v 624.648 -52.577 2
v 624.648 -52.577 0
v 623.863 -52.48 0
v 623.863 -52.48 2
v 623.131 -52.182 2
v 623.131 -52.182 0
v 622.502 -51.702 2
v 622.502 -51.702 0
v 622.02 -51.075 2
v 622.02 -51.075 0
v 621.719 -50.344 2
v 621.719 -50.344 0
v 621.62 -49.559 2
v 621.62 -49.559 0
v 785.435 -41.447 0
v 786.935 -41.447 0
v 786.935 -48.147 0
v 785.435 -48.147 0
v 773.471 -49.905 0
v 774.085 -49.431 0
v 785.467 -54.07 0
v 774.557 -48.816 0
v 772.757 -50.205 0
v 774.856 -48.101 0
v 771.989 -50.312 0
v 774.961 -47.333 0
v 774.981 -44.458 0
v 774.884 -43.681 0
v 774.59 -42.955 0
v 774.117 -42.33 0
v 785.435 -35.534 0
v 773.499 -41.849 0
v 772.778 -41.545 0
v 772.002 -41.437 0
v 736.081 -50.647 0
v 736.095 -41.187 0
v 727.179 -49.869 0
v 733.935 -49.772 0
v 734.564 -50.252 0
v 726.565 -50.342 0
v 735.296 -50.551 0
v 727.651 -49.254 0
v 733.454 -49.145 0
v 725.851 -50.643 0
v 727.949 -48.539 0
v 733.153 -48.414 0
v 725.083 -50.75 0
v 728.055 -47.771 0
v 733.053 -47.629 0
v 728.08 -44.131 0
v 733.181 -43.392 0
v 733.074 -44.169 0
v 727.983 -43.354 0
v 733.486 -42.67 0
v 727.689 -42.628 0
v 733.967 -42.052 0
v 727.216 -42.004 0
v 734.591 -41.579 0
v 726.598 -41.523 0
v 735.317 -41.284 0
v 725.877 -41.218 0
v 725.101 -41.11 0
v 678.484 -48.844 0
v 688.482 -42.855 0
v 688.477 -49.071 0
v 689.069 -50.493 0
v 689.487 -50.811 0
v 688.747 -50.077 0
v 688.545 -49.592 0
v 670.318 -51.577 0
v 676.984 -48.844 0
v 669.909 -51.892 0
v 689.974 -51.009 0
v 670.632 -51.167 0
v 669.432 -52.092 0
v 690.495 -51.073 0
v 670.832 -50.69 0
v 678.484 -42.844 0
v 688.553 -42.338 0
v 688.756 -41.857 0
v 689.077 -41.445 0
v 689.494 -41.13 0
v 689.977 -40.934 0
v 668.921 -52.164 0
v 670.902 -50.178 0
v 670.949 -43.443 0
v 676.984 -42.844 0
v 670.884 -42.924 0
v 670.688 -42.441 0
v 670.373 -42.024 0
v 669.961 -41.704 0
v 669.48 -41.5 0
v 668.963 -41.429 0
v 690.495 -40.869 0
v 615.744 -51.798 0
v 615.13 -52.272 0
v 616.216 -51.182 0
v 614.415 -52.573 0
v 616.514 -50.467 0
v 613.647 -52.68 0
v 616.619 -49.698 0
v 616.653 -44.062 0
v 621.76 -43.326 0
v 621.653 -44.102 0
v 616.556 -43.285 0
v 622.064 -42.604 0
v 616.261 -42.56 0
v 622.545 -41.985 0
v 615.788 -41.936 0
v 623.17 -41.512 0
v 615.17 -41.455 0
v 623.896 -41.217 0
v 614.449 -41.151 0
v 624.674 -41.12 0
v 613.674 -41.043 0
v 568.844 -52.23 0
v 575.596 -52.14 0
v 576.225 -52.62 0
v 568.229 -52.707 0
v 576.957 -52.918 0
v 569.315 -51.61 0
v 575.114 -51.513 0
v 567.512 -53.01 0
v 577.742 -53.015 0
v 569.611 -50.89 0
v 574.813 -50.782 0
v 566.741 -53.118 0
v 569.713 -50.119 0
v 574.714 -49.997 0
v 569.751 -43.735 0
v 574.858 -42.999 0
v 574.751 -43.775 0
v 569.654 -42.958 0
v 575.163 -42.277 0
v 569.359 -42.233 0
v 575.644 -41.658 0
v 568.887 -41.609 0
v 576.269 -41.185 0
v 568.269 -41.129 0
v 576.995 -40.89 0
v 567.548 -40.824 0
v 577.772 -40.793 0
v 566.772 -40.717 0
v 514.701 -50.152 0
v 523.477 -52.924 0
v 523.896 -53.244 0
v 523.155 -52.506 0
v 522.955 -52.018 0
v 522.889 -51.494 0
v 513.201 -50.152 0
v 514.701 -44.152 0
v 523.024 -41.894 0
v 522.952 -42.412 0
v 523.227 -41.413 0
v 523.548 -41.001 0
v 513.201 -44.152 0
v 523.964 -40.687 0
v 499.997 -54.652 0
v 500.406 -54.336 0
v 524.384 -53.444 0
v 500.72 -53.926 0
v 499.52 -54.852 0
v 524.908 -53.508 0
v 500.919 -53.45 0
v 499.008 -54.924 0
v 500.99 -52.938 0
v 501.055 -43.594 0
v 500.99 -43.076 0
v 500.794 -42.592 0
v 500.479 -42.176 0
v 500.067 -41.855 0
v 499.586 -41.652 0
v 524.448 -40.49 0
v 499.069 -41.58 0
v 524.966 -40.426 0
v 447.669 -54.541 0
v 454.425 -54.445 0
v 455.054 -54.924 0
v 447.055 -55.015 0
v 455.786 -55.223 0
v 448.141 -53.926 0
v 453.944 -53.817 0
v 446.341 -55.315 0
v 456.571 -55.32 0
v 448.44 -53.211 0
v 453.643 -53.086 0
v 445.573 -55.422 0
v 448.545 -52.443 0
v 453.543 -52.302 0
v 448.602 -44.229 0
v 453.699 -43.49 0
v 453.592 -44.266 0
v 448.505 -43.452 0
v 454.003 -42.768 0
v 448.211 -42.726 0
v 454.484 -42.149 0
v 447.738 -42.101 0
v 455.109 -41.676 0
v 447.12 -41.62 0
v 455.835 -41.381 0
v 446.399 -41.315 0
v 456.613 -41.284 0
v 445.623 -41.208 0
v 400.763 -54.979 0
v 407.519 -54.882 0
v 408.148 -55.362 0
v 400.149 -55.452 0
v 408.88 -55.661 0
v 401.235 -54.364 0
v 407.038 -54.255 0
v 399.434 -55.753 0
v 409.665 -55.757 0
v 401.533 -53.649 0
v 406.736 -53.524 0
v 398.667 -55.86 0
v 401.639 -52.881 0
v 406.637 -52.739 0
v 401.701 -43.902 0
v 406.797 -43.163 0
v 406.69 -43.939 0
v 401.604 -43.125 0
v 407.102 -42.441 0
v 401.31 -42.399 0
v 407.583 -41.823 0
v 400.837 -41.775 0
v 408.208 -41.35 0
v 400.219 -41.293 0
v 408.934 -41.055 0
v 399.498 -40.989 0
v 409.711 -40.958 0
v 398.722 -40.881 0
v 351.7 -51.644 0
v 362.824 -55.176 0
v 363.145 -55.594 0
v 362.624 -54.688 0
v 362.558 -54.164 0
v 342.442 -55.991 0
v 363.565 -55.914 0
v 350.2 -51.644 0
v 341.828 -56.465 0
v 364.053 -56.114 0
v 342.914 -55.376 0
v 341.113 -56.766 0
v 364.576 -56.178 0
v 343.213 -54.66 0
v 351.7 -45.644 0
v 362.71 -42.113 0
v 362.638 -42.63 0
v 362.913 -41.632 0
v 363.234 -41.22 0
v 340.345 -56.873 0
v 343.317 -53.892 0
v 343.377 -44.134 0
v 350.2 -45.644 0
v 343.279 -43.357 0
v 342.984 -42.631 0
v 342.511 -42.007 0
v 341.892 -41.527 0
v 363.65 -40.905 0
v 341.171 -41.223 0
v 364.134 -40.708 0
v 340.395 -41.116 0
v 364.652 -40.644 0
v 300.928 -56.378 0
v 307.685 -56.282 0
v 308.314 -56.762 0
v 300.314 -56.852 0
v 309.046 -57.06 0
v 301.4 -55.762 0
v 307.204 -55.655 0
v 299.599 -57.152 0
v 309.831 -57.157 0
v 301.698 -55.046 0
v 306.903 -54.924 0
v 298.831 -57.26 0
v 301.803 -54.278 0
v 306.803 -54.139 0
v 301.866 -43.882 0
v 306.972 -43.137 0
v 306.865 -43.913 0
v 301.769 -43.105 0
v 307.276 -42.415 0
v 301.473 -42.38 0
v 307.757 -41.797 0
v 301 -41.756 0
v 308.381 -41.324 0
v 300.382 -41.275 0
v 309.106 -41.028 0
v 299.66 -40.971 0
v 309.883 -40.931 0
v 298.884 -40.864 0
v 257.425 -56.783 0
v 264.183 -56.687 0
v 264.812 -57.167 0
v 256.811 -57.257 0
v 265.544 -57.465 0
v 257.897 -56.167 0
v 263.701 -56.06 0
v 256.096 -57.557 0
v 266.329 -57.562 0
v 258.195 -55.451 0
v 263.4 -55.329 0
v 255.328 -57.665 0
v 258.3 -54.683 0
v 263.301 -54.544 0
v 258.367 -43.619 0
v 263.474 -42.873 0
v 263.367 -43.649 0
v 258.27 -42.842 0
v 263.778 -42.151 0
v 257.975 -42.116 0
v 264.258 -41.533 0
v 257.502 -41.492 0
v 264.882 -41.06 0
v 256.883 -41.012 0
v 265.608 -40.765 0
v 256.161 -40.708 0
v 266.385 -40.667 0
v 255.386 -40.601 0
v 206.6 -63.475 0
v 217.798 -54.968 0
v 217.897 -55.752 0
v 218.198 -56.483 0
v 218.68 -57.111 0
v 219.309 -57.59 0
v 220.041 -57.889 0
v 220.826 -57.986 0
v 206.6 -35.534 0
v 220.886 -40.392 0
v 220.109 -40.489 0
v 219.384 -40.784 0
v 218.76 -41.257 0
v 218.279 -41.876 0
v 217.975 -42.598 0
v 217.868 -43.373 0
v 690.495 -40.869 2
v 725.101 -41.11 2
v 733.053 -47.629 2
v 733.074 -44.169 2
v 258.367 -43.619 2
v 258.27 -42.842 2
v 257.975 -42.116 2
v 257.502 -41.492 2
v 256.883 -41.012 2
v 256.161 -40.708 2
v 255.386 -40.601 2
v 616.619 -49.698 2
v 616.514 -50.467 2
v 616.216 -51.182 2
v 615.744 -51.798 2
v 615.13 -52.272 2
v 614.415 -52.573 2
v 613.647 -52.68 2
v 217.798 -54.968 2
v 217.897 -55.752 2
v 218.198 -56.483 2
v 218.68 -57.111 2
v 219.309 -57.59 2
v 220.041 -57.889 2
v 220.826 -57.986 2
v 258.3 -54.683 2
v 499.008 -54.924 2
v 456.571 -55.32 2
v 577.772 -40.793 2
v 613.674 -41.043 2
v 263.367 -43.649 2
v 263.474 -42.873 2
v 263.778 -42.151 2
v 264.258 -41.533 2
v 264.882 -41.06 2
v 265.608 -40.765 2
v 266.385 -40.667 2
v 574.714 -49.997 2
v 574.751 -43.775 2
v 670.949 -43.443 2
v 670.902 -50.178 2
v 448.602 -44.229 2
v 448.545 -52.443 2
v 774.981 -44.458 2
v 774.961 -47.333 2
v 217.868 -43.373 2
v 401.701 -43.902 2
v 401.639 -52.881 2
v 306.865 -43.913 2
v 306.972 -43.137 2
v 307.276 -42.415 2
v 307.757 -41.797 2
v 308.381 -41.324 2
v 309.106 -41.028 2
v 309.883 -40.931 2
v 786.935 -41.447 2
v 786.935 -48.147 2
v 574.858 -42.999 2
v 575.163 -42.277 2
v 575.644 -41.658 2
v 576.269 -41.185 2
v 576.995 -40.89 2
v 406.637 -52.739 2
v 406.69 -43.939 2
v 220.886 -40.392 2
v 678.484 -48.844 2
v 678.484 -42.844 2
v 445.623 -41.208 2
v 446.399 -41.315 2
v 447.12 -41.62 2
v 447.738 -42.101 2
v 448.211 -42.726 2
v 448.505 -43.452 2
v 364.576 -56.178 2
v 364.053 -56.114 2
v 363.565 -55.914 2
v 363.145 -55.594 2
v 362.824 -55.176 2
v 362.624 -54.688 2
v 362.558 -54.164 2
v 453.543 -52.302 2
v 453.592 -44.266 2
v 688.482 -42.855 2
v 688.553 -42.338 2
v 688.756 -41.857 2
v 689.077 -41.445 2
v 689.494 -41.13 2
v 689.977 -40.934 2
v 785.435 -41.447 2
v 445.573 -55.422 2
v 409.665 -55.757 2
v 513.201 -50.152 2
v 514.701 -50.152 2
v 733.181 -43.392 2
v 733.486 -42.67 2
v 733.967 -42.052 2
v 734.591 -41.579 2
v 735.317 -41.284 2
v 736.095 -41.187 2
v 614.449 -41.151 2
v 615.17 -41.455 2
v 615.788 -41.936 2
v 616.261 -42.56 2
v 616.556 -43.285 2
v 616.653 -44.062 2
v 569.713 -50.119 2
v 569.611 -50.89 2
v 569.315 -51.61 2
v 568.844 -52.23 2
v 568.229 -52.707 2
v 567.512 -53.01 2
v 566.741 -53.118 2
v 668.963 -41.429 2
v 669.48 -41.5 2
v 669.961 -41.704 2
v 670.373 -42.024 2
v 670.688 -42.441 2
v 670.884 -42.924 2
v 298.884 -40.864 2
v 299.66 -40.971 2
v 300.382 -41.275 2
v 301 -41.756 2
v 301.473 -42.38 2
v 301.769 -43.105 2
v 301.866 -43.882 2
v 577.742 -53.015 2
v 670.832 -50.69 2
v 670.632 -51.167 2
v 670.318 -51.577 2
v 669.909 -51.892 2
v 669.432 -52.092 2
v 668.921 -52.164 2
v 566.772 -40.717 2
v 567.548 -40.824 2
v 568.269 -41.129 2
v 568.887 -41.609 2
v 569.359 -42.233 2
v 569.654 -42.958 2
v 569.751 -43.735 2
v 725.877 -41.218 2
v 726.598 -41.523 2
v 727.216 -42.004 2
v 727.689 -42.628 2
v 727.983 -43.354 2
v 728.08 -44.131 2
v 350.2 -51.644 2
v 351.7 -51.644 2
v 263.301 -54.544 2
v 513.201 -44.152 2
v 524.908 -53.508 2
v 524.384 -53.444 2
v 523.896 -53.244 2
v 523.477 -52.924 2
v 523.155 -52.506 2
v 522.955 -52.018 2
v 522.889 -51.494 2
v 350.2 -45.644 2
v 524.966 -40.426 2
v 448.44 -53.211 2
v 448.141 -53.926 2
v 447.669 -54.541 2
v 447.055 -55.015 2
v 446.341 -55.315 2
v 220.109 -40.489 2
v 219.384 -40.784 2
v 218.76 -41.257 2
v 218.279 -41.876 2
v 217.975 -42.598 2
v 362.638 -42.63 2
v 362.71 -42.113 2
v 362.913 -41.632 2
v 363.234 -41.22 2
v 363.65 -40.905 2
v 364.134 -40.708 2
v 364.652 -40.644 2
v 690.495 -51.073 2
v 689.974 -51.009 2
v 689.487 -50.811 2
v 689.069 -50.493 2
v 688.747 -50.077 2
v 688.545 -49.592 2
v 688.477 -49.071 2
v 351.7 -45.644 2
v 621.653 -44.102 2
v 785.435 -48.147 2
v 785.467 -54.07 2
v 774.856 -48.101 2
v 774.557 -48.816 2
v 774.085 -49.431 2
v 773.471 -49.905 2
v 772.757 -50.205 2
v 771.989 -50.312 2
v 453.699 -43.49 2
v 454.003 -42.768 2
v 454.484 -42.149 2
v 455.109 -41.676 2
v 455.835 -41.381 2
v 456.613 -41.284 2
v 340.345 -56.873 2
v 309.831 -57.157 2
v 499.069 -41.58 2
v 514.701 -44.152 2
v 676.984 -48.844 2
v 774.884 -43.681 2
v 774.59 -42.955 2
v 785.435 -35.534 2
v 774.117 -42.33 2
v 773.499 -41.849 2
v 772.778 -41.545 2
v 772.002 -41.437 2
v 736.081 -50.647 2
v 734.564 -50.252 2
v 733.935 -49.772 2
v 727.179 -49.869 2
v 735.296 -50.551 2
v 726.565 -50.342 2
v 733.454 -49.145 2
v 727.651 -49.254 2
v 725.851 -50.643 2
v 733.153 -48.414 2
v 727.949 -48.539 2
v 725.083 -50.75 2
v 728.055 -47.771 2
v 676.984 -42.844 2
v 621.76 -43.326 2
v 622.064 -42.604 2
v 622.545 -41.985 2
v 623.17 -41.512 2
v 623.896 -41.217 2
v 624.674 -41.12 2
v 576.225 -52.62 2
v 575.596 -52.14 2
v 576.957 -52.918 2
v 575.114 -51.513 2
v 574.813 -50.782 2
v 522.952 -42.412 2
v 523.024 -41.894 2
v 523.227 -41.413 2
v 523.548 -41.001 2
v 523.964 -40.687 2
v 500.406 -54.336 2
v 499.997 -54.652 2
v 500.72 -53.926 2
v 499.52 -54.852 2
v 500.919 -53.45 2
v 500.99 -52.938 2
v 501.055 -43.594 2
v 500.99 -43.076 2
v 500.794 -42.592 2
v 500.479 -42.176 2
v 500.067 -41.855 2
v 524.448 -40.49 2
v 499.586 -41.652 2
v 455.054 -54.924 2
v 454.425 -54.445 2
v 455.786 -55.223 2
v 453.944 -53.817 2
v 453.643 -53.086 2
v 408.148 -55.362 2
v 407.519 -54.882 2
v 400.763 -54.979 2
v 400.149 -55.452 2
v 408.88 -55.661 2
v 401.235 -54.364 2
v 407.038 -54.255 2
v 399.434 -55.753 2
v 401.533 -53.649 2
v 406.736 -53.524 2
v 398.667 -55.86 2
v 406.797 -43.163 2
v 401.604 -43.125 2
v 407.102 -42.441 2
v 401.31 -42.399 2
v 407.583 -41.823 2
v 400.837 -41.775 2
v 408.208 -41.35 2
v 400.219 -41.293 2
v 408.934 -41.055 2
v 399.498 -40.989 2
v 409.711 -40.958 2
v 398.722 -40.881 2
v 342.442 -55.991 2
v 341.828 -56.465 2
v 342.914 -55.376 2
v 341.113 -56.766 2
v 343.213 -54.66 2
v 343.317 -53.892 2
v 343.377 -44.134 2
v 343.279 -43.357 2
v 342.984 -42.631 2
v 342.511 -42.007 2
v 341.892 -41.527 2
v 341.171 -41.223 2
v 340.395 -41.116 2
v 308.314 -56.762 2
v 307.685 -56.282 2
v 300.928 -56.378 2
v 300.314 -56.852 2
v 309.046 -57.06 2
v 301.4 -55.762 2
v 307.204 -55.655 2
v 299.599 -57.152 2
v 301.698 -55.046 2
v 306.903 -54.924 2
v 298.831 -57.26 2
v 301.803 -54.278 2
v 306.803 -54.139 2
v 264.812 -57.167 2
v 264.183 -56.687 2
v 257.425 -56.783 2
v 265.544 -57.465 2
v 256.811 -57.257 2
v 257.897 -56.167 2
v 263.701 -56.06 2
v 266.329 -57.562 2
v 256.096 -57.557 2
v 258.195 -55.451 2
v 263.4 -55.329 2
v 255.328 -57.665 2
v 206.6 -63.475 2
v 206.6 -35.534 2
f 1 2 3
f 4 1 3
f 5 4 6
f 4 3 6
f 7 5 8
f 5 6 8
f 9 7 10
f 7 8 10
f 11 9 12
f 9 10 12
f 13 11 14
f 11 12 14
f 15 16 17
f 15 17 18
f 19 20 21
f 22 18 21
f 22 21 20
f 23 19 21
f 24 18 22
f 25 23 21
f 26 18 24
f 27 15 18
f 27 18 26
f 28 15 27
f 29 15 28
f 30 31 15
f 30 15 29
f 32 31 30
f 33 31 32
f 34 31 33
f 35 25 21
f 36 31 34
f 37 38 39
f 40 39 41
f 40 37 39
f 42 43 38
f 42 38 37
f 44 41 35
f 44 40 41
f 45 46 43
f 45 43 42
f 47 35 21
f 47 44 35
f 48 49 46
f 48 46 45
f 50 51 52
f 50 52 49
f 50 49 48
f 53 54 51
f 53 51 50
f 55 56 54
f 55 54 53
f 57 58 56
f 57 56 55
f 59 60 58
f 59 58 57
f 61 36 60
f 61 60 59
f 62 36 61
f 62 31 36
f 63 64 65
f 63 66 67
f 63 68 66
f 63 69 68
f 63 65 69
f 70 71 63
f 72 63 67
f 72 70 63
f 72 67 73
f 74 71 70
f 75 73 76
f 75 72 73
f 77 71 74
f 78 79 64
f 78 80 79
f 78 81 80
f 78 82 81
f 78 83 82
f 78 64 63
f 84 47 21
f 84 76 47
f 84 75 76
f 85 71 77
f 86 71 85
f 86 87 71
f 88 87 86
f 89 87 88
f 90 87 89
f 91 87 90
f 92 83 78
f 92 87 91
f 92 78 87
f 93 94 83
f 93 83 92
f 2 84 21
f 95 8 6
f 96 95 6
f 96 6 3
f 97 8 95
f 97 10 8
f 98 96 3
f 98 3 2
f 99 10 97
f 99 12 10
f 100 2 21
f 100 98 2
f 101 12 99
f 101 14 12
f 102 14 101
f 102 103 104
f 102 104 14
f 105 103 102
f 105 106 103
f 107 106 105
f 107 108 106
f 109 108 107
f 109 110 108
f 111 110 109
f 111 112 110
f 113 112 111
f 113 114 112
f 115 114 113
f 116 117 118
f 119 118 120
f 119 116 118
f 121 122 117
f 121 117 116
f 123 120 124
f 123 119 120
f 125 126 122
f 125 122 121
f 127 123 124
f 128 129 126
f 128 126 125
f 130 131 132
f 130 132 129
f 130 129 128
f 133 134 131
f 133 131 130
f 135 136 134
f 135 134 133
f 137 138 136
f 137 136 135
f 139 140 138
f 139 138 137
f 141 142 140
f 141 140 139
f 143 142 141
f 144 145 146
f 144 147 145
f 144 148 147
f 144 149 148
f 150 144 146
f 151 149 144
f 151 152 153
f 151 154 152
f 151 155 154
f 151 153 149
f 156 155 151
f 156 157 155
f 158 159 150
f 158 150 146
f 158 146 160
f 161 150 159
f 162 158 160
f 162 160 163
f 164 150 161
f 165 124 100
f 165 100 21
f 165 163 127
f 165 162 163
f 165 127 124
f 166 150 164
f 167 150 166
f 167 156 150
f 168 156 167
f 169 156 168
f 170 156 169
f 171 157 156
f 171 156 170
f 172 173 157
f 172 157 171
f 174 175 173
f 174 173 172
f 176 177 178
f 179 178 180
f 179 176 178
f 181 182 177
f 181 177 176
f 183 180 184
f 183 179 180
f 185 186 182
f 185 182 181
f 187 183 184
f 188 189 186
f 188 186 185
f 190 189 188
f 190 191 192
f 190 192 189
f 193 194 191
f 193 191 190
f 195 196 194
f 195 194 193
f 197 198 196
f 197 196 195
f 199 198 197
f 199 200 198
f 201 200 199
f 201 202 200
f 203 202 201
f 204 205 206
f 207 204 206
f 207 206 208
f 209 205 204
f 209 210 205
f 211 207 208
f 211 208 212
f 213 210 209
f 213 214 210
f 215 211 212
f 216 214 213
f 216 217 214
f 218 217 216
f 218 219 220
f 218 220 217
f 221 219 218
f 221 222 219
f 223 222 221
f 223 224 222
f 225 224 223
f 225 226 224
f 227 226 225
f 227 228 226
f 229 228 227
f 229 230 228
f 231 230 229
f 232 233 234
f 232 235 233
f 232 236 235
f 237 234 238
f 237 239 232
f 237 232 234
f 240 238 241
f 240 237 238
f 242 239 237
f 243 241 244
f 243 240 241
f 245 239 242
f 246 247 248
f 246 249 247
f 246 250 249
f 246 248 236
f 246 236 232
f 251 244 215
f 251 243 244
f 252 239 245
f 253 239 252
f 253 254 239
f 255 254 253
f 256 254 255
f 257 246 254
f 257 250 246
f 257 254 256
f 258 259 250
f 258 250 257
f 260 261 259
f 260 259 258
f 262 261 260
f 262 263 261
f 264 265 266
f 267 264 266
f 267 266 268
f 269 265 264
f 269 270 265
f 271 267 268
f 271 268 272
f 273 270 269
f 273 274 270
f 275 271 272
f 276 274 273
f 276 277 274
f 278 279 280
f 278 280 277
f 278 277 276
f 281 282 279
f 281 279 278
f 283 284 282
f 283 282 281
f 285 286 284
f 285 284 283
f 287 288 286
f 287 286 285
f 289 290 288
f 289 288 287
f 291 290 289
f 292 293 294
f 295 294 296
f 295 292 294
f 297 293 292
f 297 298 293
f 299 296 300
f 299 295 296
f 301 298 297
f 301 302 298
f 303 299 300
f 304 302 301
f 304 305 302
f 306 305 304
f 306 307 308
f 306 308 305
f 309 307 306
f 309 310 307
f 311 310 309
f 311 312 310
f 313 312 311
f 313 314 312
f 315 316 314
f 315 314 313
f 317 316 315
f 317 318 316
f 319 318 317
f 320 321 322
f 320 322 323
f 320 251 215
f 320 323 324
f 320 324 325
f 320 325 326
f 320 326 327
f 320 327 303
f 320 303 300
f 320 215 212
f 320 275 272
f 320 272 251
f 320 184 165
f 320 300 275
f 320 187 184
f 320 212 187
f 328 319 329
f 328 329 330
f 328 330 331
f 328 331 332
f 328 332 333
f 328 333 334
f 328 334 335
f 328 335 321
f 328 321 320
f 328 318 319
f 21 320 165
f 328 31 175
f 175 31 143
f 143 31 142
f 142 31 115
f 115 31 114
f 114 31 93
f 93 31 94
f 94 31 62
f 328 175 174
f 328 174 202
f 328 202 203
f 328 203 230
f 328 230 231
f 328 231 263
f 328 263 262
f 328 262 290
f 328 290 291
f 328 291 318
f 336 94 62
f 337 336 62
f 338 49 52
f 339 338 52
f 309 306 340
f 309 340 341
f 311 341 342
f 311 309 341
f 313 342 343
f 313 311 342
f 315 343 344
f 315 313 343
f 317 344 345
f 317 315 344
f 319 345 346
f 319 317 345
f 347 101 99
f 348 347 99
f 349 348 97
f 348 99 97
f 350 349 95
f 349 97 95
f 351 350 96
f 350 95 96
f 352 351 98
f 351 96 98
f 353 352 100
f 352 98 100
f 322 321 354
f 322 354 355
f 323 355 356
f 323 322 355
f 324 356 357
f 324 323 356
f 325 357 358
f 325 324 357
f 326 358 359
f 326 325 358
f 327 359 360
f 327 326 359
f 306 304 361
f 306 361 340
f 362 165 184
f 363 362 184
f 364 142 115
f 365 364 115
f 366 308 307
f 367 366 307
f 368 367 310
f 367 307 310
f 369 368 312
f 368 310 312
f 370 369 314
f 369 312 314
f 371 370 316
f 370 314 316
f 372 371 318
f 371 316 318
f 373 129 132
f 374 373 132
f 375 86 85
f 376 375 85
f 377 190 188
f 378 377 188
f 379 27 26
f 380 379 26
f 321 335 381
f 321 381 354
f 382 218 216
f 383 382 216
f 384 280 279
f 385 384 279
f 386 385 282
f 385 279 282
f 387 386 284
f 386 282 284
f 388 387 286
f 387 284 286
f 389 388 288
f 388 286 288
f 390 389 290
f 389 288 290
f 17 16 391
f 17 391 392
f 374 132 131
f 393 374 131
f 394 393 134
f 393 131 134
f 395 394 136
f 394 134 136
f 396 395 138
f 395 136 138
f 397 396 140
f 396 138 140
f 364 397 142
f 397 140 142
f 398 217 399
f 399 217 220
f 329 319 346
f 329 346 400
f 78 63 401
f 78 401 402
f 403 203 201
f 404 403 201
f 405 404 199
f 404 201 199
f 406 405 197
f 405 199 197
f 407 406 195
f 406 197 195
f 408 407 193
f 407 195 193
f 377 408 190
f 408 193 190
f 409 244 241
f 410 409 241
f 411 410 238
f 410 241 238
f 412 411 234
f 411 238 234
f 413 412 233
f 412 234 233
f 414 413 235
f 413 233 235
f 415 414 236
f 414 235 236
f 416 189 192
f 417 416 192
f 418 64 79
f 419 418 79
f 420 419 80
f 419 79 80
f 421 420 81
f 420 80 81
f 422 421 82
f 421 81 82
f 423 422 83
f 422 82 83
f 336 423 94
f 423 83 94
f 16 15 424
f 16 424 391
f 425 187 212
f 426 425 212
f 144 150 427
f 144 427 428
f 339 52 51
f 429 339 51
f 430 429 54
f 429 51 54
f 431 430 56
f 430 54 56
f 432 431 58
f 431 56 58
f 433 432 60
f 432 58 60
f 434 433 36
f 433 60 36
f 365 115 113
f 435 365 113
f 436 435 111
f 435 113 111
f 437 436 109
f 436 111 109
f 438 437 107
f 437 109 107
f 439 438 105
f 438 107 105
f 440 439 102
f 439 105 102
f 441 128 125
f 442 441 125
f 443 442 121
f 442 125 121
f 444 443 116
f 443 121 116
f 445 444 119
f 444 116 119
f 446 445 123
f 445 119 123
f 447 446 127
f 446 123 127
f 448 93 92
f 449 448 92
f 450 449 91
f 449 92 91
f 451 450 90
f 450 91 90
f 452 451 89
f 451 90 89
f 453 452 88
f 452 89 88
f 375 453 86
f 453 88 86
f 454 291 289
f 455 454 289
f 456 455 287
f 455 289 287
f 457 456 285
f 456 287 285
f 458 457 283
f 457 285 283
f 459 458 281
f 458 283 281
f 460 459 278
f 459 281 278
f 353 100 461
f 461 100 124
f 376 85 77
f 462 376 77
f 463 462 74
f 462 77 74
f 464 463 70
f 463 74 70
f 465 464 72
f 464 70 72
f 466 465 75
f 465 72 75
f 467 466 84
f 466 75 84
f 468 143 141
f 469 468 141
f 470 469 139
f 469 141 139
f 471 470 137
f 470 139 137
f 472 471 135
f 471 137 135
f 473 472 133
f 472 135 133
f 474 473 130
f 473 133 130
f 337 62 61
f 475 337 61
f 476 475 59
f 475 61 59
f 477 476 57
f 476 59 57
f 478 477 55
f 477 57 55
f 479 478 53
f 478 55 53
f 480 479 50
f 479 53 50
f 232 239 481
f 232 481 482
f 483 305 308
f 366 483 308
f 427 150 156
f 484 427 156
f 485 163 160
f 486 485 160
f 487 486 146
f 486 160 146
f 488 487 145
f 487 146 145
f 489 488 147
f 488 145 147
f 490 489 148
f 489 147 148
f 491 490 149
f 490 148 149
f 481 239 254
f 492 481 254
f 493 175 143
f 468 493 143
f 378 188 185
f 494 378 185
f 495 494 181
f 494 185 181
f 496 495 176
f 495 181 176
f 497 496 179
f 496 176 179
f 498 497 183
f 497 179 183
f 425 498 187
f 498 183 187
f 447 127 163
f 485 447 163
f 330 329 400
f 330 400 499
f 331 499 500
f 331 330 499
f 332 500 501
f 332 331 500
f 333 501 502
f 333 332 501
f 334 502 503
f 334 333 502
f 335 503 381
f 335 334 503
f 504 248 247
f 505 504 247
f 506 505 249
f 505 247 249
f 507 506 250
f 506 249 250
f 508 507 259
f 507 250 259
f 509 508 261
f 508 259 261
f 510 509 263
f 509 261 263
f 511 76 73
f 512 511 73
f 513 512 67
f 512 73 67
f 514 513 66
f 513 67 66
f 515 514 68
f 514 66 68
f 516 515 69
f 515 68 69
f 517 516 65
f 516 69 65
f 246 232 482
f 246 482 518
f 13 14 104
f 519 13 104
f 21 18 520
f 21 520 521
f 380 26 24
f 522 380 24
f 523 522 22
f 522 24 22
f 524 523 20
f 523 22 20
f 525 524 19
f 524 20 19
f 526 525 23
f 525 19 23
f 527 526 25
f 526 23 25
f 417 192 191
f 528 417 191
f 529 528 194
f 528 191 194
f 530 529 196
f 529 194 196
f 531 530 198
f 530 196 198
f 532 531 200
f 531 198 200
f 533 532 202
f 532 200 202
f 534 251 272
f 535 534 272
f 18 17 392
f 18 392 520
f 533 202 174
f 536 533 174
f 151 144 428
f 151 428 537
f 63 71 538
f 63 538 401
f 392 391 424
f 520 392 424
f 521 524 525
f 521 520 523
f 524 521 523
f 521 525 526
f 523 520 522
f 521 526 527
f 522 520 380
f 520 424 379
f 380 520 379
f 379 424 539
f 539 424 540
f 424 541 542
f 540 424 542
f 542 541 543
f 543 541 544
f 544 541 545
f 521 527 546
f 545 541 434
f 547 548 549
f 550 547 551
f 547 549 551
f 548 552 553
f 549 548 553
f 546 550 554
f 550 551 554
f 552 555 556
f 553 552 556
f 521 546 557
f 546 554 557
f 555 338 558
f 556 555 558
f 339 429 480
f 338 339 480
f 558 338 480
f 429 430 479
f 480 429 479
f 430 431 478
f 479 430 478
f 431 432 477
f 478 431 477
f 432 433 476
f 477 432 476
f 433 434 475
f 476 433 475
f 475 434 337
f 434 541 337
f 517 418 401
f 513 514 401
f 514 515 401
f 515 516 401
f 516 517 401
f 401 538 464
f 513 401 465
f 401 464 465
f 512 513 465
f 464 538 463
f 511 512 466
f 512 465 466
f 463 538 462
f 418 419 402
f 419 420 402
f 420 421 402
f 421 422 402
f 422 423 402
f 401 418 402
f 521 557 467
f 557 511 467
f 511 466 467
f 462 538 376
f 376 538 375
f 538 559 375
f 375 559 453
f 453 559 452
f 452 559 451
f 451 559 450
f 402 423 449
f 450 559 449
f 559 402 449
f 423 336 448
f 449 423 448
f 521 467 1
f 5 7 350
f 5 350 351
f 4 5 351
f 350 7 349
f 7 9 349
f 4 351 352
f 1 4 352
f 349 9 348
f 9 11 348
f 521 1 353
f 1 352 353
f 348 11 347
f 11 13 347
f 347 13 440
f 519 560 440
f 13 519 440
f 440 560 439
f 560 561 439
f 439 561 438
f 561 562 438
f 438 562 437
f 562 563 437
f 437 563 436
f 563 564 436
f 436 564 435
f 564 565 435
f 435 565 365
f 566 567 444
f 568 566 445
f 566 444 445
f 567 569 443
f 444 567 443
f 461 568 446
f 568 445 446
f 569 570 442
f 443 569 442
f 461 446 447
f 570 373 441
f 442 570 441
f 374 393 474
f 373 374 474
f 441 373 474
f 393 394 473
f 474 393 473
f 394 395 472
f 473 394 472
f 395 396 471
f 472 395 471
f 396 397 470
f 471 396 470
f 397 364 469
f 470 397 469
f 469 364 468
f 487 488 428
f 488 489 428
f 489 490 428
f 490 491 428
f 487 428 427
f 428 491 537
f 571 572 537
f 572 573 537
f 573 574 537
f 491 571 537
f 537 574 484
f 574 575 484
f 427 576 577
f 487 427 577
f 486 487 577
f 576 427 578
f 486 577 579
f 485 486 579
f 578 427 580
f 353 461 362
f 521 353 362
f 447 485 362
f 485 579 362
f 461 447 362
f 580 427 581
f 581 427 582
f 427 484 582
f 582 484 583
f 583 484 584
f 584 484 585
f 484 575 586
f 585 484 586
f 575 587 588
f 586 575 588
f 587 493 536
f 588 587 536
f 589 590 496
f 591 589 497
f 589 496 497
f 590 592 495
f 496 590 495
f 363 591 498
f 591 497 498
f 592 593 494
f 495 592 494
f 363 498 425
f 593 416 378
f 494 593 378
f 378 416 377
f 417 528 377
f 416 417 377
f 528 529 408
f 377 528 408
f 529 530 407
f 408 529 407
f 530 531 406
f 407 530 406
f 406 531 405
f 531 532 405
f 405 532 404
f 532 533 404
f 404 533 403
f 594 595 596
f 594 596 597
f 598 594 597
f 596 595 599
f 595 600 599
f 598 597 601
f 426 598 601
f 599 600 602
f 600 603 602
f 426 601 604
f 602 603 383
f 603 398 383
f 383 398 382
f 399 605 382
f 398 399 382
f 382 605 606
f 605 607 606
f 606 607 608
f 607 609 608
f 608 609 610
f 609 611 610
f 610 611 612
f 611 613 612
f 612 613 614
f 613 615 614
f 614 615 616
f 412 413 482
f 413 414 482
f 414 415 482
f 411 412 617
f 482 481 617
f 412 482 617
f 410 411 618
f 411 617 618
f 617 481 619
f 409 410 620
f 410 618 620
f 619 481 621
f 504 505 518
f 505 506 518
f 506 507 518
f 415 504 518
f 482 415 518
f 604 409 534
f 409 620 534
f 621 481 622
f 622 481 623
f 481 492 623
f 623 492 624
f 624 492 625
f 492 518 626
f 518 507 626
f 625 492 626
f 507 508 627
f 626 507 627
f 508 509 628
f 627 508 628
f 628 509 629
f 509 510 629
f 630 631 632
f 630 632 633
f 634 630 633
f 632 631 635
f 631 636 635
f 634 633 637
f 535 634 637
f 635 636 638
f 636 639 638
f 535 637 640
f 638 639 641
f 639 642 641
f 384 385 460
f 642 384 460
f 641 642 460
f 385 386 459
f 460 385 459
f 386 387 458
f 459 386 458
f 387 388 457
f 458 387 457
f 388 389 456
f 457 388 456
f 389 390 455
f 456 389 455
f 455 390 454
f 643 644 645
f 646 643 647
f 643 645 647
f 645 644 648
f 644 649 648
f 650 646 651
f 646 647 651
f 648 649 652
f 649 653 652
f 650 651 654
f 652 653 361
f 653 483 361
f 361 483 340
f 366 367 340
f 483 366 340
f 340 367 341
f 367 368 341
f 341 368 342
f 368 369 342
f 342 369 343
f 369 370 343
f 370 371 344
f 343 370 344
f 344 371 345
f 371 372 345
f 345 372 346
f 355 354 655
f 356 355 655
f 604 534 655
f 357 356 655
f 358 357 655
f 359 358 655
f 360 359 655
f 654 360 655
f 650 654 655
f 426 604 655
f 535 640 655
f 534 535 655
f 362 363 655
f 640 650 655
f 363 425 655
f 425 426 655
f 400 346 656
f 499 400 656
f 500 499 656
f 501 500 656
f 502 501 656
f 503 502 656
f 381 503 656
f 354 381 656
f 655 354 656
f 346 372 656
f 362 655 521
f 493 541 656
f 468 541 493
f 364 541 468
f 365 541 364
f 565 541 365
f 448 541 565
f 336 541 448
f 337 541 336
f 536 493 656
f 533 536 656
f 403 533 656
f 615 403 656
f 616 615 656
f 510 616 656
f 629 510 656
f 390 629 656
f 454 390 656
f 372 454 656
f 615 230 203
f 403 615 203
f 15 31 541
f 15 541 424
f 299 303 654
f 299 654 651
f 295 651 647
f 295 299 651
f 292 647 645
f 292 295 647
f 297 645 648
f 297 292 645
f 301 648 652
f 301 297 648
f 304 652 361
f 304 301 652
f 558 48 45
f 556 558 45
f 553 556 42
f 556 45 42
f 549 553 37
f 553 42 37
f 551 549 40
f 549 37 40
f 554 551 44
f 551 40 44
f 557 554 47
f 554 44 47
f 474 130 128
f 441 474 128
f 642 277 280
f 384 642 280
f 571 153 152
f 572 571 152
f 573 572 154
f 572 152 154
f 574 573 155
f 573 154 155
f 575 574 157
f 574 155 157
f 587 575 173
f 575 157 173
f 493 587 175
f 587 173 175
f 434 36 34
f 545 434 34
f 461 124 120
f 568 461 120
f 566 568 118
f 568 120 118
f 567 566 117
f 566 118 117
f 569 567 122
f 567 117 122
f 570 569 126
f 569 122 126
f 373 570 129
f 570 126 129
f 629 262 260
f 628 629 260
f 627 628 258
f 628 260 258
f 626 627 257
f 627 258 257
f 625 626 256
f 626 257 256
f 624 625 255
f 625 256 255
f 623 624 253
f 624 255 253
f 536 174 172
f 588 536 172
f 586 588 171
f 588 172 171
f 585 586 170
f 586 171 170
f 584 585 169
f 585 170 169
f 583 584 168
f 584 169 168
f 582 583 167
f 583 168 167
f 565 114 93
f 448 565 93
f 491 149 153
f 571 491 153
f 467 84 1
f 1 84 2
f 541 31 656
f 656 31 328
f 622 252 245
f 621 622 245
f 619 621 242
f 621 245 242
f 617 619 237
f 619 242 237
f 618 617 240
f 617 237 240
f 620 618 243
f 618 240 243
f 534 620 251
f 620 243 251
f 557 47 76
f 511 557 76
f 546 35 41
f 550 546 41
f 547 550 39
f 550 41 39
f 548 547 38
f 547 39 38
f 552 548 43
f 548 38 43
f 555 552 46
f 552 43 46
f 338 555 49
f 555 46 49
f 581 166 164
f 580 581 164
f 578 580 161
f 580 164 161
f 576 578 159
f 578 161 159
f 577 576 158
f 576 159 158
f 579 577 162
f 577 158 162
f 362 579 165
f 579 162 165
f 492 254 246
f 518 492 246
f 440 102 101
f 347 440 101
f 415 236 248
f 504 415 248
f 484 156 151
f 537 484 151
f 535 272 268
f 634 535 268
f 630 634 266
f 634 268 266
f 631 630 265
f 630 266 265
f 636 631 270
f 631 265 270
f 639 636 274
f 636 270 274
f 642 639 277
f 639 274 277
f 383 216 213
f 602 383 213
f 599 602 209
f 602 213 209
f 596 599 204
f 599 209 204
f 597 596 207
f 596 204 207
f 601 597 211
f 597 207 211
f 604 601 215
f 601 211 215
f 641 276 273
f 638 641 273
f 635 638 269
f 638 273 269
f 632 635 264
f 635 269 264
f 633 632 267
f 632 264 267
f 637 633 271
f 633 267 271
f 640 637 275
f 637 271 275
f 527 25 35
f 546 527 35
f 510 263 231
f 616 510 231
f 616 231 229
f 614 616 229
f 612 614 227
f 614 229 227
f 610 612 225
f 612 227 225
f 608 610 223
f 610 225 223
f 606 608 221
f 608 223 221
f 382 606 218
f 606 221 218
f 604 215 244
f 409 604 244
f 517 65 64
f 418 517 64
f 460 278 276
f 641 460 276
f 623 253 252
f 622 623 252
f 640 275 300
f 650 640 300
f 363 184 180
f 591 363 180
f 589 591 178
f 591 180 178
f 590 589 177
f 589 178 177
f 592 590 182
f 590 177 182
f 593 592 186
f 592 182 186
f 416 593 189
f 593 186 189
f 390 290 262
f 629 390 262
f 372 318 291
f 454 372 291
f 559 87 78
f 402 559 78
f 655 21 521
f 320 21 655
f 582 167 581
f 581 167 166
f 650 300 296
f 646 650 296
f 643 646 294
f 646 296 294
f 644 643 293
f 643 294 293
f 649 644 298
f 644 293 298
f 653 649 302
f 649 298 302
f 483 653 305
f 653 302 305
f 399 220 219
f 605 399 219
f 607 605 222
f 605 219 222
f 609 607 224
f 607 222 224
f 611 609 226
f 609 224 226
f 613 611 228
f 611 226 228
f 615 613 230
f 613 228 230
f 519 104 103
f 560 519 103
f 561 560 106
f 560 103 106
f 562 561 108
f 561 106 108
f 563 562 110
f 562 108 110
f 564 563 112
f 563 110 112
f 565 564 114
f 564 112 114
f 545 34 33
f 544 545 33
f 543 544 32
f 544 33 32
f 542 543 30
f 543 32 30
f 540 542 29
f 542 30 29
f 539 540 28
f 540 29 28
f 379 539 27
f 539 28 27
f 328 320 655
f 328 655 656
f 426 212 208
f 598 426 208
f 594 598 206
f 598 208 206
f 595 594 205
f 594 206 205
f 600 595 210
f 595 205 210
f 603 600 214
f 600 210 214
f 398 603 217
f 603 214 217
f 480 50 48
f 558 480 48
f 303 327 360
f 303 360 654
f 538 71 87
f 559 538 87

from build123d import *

# Parameters (mm, degrees)
MODEL_W         = 1.5
MODEL_H         = 6
EXTRUDE_1_DEPTH = 2


with BuildPart() as part:
    # Model → 凸台-拉伸1 (new body)
    with BuildSketch(Plane.XY):
        Polygon((785.435098254, -35.533863858), (785.435098254, -41.446863858), (786.935098254, -41.446863858), (786.935098254, -48.147363858), (785.435098254, -48.147363858), (785.466503891, -54.069864101), (206.600074702, -63.475463858), (206.600074702, -35.533863858), (351.503693607, -35.533863858), (514.281059293, -35.533863858), (677.839139625, -35.533863858), align=None)
        with Locations((350.950492985, -48.643663858)):
            Rectangle(MODEL_W, MODEL_H, mode=Mode.SUBTRACT)
        with Locations((513.951245542, -47.152263858)):
            Rectangle(MODEL_W, MODEL_H, mode=Mode.SUBTRACT)
        with Locations((677.733784151, -45.843763858)):
            Rectangle(MODEL_W, MODEL_H, mode=Mode.SUBTRACT)
        with BuildLine():
            Line((255.385635934, -40.600624691), (220.886272881, -40.391624977))
            ThreePointArc((220.886272881, -40.391624977), (218.759668454, -41.257437629), (217.86815404, -43.373396038))
            Line((217.86815404, -43.373396038), (217.797915248, -54.967639695))
            ThreePointArc((217.797915248, -54.967639695), (218.679987229, -57.11057571), (220.825776537, -57.985683696))
            Line((220.825776537, -57.985683696), (255.328350826, -57.664607948))
            ThreePointArc((255.328350826, -57.664607948), (257.425196612, -56.782610808), (258.300379439, -54.682911728))
            Line((258.300379439, -54.682911728), (258.367406995, -43.618743532))
            ThreePointArc((258.367406995, -43.618743532), (257.501594343, -41.492139105), (255.385635934, -40.600624691))
        make_face(mode=Mode.SUBTRACT)
        with BuildLine():
            Line((343.376561044, -44.133735324), (343.317446229, -53.891755741))
            ThreePointArc((343.317446229, -53.891755741), (342.442263402, -55.99145482), (340.345417617, -56.873451961))
            Line((340.345417617, -56.873451961), (309.831033894, -57.157414209))
            ThreePointArc((309.831033894, -57.157414209), (307.685244586, -56.282306223), (306.803172604, -54.139370208))
            Line((306.803172604, -54.139370208), (306.865127466, -43.912546338))
            ThreePointArc((306.865127466, -43.912546338), (307.75664188, -41.796587929), (309.883246307, -40.930775277))
            Line((309.883246307, -40.930775277), (340.394789984, -41.115616483))
            ThreePointArc((340.394789984, -41.115616483), (342.510748392, -42.007130897), (343.376561044, -44.133735324))
        make_face(mode=Mode.SUBTRACT)
        with BuildLine():
            Line((266.384844011, -40.667258713), (298.884247648, -40.864142523))
            ThreePointArc((298.884247648, -40.864142523), (301.000206057, -41.755656937), (301.866018709, -43.882261364))
            Line((301.866018709, -43.882261364), (301.803040049, -54.278082537))
            ThreePointArc((301.803040049, -54.278082537), (300.927857222, -56.377781616), (298.831011437, -57.259778757))
            Line((298.831011437, -57.259778757), (266.328582721, -57.562241451))
            ThreePointArc((266.328582721, -57.562241451), (264.182793413, -56.687133465), (263.300721432, -54.544197451))
            Line((263.300721432, -54.544197451), (263.36672517, -43.649029774))
            ThreePointArc((263.36672517, -43.649029774), (264.258239584, -41.533071365), (266.384844011, -40.667258713))
        make_face(mode=Mode.SUBTRACT)
        with BuildLine():
            Line((364.652046592, -40.643787214), (398.722200855, -40.881122213))
            ThreePointArc((398.722200855, -40.881122213), (400.837348938, -41.774557453), (401.701230373, -43.901947122))
            Line((401.701230373, -43.901947122), (401.638680431, -52.881179864))
            ThreePointArc((401.638680431, -52.881179864), (400.762583047, -54.979090054), (398.666752779, -55.860151503))
            Line((398.666752779, -55.860151503), (364.576429773, -56.178336732))
            ThreePointArc((364.576429773, -56.178336732), (363.145224808, -55.594310395), (362.557811922, -54.164492045))
            Line((362.557811922, -54.164492045), (362.638163319, -42.629806893))
            ThreePointArc((362.638163319, -42.629806893), (363.233786812, -41.219708171), (364.652046592, -40.643787214))
        make_face(mode=Mode.SUBTRACT)
        with BuildLine():
            Line((409.711176711, -40.957672161), (445.623178301, -41.207837593))
            ThreePointArc((445.623178301, -41.207837593), (447.738326383, -42.101272833), (448.602207819, -44.228662502))
            Line((448.602207819, -44.228662502), (448.544983573, -52.443375482))
            ThreePointArc((448.544983573, -52.443375482), (447.668886189, -54.541285672), (445.573055921, -55.422347121))
            Line((445.573055921, -55.422347121), (409.66496734, -55.757498635))
            ThreePointArc((409.66496734, -55.757498635), (407.519124281, -54.882420802), (406.637022827, -52.739455411))
            Line((406.637022827, -52.739455411), (406.690334064, -43.939425485))
            ThreePointArc((406.690334064, -43.939425485), (407.582817543, -41.822510116), (409.711176711, -40.957672161))
        make_face(mode=Mode.SUBTRACT)
        with BuildLine():
            Line((456.612848306, -41.284392377), (499.068785272, -41.580143304))
            ThreePointArc((499.068785272, -41.580143304), (500.478883993, -42.175766798), (501.05480495, -43.594026577))
            Line((501.05480495, -43.594026577), (500.989716833, -52.937621934))
            ThreePointArc((500.989716833, -52.937621934), (500.40565191, -54.336228727), (499.008431732, -54.923603027))
            Line((499.008431732, -54.923603027), (456.571270482, -55.319694254))
            ThreePointArc((456.571270482, -55.319694254), (454.425427423, -54.44461642), (453.543325968, -52.301651029))
            Line((453.543325968, -52.301651029), (453.592005659, -44.2661457))
            ThreePointArc((453.592005659, -44.2661457), (454.484489138, -42.149230332), (456.612848306, -41.284392377))
        make_face(mode=Mode.SUBTRACT)
        with BuildLine():
            Line((524.966262719, -40.425528272), (566.772351734, -40.716752315))
            ThreePointArc((566.772351734, -40.716752315), (568.886543297, -41.609218056), (569.751398989, -43.734853418))
            Line((569.751398989, -43.734853418), (569.712675089, -50.118674115))
            ThreePointArc((569.712675089, -50.118674115), (568.843585982, -52.229548043), (566.740674761, -53.117731028))
            Line((566.740674761, -53.117731028), (524.907725967, -53.508182781))
            ThreePointArc((524.907725967, -53.508182781), (523.476521002, -52.924156445), (522.889108116, -51.494338094))
            Line((522.889108116, -51.494338094), (522.952379447, -42.41154795))
            ThreePointArc((522.952379447, -42.41154795), (523.54800294, -41.001449229), (524.966262719, -40.425528272))
        make_face(mode=Mode.SUBTRACT)
        with BuildLine():
            Line((577.772161323, -40.793377732), (613.674023329, -41.04347253))
            ThreePointArc((613.674023329, -41.04347253), (615.788214892, -41.935938271), (616.653070584, -44.061573634))
            Line((616.653070584, -44.061573634), (616.618923292, -49.698231202))
            ThreePointArc((616.618923292, -49.698231202), (615.743769843, -51.797900808), (613.646977903, -52.679926646))
            Line((613.646977903, -52.679926646), (577.741570583, -53.015053135))
            ThreePointArc((577.741570583, -53.015053135), (575.595727525, -52.139975302), (574.71362607, -49.99700991))
            Line((574.71362607, -49.99700991), (574.751318676, -43.775131055))
            ThreePointArc((574.751318676, -43.775131055), (575.643802155, -41.658215687), (577.772161323, -40.793377732))
        make_face(mode=Mode.SUBTRACT)
        with BuildLine():
            Line((624.673832918, -41.120097947), (668.962768968, -41.42861767))
            ThreePointArc((668.962768968, -41.42861767), (670.372867689, -42.024241164), (670.948788646, -43.442500943))
            Line((670.948788646, -43.442500943), (670.901868396, -50.178044171))
            ThreePointArc((670.901868396, -50.178044171), (670.317803474, -51.576650964), (668.920583295, -52.164025264))
            Line((668.920583295, -52.164025264), (624.647873725, -52.577248753))
            ThreePointArc((624.647873725, -52.577248753), (622.502030667, -51.70217092), (621.619929212, -49.559205528))
            Line((621.619929212, -49.559205528), (621.652990271, -44.101851271))
            ThreePointArc((621.652990271, -44.101851271), (622.54547375, -41.984935902), (624.673832918, -41.120097947))
        make_face(mode=Mode.SUBTRACT)
        with BuildLine():
            Line((690.49539131, -40.869236621), (725.101155649, -41.110302716))
            ThreePointArc((725.101155649, -41.110302716), (727.216303731, -42.003737956), (728.080185166, -44.131127625))
            Line((728.080185166, -44.131127625), (728.054828945, -47.77108965))
            ThreePointArc((728.054828945, -47.77108965), (727.178731561, -49.86899984), (725.082901293, -50.750061289))
            Line((725.082901293, -50.750061289), (690.49539131, -51.072887059))
            ThreePointArc((690.49539131, -51.072887059), (689.068579953, -50.493230381), (688.476725528, -49.07143544))
            Line((688.476725528, -49.07143544), (688.481508037, -42.8552563))
            ThreePointArc((688.481508037, -42.8552563), (689.077131531, -41.445157578), (690.49539131, -40.869236621))
        make_face(mode=Mode.SUBTRACT)
        with BuildLine():
            Line((736.09497932, -41.186886435), (772.002133094, -41.437018096))
            ThreePointArc((772.002133094, -41.437018096), (774.117281177, -42.330453336), (774.981162612, -44.457843005))
            Line((774.981162612, -44.457843005), (774.961132087, -47.333285268))
            ThreePointArc((774.961132087, -47.333285268), (774.085034703, -49.431195458), (771.989204435, -50.312256907))
            Line((771.989204435, -50.312256907), (736.081115854, -50.647408421))
            ThreePointArc((736.081115854, -50.647408421), (733.935272795, -49.772330588), (733.053171341, -47.629365197))
            Line((733.053171341, -47.629365197), (733.074136673, -44.168639758))
            ThreePointArc((733.074136673, -44.168639758), (733.966620152, -42.051724389), (736.09497932, -41.186886435))
        make_face(mode=Mode.SUBTRACT)
    extrude(amount=EXTRUDE_1_DEPTH)


solid = part.part
